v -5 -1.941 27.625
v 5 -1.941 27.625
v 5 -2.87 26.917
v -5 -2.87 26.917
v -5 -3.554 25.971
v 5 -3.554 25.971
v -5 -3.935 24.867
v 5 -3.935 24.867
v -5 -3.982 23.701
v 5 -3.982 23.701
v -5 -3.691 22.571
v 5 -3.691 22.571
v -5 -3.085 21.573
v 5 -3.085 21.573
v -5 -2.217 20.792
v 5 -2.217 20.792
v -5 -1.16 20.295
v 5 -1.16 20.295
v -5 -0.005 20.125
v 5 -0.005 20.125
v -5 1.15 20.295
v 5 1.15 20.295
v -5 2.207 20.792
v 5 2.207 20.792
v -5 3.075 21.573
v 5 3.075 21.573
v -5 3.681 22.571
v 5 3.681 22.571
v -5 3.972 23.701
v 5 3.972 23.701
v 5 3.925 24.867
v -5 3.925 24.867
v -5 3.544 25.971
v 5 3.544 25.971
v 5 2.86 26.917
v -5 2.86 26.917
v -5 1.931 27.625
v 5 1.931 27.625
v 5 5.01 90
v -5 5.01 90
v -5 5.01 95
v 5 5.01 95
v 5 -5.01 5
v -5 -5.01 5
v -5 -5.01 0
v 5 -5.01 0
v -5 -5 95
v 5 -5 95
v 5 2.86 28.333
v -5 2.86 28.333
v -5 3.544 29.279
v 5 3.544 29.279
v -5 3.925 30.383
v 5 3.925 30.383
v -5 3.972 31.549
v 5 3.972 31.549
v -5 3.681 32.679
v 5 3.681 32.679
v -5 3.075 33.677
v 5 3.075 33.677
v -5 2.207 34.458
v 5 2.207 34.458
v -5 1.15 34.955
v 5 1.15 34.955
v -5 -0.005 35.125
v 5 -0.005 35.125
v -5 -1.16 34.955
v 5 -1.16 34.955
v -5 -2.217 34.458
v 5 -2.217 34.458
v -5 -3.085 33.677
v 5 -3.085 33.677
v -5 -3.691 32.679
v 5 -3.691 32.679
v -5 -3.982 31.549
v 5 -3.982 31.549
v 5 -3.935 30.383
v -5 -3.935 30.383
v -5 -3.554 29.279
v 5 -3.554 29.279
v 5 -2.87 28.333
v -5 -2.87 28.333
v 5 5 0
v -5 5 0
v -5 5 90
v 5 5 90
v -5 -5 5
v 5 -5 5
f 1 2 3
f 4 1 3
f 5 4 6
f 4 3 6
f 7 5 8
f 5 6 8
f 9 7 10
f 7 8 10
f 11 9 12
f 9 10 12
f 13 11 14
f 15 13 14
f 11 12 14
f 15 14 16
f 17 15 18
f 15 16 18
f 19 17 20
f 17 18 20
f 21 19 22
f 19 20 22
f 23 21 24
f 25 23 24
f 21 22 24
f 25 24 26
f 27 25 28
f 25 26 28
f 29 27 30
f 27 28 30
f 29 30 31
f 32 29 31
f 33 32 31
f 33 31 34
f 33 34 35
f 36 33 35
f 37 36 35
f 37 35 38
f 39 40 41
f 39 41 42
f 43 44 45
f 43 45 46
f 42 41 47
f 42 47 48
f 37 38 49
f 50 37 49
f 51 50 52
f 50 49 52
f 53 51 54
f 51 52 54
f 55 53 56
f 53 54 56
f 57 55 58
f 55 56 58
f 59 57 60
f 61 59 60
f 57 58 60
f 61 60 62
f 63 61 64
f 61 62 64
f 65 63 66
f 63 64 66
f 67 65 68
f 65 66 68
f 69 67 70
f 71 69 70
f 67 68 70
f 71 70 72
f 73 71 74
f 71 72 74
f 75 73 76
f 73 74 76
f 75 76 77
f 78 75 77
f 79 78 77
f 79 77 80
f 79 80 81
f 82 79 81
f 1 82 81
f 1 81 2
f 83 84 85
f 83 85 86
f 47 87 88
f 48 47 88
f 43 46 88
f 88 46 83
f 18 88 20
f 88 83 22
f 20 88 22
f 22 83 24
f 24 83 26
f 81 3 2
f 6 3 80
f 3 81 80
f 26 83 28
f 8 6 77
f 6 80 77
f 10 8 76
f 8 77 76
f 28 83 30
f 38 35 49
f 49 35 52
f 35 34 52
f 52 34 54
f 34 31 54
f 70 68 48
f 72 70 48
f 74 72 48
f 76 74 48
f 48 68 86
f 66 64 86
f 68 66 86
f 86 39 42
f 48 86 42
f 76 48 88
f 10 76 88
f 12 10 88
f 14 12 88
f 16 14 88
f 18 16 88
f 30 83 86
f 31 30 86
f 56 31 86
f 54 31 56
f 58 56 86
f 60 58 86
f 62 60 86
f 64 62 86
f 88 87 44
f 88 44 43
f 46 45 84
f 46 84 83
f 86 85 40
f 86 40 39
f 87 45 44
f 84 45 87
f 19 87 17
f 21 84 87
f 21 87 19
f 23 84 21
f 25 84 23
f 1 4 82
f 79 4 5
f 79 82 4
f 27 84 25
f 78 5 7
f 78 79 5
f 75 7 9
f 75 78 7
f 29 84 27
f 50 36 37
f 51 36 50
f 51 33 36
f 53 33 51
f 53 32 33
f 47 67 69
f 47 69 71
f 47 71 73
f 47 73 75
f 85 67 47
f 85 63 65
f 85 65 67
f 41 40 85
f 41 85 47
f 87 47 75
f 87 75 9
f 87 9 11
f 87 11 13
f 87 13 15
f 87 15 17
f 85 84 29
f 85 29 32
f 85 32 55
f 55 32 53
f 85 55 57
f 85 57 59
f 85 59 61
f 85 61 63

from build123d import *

# Parameters (mm, degrees)
ESQUISSE1_W             = 10
ESQUISSE1_H             = 10
BOSS_EXTRU_1_DEPTH      = 95
ESQUISSE2_W             = 10
ESQUISSE2_H             = 5
BOSS_EXTRU_2_DEPTH      = 0.01
ESQUISSE3_W             = 10
ESQUISSE3_H             = 5
BOSS_EXTRU_3_DEPTH      = 0.01
ENL_V_MAT_EXTRU_2_DEPTH = 96.656155578


with BuildPart() as part:
    # Esquisse1 → Boss.-Extru.1 (new body)
    with BuildSketch(Plane.XY):
        Rectangle(ESQUISSE1_W, ESQUISSE1_H)
    extrude(amount=BOSS_EXTRU_1_DEPTH)

    # Esquisse2 → Boss.-Extru.2 (add)
    with BuildSketch(Plane(origin=(0, 5, 0), x_dir=(1, 0, 0), z_dir=(0, 1, 0))):
        with Locations((0, -92.5)):
            Rectangle(ESQUISSE2_W, ESQUISSE2_H)
    extrude(amount=BOSS_EXTRU_2_DEPTH)

    # Esquisse3 → Boss.-Extru.3 (add)
    with BuildSketch(Plane.XZ.offset(5)):
        with Locations((0, 2.5)):
            Rectangle(ESQUISSE3_W, ESQUISSE3_H)
    extrude(amount=BOSS_EXTRU_3_DEPTH)

    # Esquisse6 → Enlèv. mat.-Extru.2 (cut, through all)
    with BuildSketch(Plane(origin=(5, 0, 0), x_dir=(0, 0, -1), z_dir=(1, 0, 0))):
        with BuildLine():
            ThreePointArc((-27.625, 1.931491673), (-35.125, -0.005), (-27.625, -1.941491673))
            ThreePointArc((-27.625, -1.941491673), (-20.125, -0.005), (-27.625, 1.931491673))
        make_face()
    extrude(amount=-ENL_V_MAT_EXTRU_2_DEPTH, mode=Mode.SUBTRACT)


solid = part.part
